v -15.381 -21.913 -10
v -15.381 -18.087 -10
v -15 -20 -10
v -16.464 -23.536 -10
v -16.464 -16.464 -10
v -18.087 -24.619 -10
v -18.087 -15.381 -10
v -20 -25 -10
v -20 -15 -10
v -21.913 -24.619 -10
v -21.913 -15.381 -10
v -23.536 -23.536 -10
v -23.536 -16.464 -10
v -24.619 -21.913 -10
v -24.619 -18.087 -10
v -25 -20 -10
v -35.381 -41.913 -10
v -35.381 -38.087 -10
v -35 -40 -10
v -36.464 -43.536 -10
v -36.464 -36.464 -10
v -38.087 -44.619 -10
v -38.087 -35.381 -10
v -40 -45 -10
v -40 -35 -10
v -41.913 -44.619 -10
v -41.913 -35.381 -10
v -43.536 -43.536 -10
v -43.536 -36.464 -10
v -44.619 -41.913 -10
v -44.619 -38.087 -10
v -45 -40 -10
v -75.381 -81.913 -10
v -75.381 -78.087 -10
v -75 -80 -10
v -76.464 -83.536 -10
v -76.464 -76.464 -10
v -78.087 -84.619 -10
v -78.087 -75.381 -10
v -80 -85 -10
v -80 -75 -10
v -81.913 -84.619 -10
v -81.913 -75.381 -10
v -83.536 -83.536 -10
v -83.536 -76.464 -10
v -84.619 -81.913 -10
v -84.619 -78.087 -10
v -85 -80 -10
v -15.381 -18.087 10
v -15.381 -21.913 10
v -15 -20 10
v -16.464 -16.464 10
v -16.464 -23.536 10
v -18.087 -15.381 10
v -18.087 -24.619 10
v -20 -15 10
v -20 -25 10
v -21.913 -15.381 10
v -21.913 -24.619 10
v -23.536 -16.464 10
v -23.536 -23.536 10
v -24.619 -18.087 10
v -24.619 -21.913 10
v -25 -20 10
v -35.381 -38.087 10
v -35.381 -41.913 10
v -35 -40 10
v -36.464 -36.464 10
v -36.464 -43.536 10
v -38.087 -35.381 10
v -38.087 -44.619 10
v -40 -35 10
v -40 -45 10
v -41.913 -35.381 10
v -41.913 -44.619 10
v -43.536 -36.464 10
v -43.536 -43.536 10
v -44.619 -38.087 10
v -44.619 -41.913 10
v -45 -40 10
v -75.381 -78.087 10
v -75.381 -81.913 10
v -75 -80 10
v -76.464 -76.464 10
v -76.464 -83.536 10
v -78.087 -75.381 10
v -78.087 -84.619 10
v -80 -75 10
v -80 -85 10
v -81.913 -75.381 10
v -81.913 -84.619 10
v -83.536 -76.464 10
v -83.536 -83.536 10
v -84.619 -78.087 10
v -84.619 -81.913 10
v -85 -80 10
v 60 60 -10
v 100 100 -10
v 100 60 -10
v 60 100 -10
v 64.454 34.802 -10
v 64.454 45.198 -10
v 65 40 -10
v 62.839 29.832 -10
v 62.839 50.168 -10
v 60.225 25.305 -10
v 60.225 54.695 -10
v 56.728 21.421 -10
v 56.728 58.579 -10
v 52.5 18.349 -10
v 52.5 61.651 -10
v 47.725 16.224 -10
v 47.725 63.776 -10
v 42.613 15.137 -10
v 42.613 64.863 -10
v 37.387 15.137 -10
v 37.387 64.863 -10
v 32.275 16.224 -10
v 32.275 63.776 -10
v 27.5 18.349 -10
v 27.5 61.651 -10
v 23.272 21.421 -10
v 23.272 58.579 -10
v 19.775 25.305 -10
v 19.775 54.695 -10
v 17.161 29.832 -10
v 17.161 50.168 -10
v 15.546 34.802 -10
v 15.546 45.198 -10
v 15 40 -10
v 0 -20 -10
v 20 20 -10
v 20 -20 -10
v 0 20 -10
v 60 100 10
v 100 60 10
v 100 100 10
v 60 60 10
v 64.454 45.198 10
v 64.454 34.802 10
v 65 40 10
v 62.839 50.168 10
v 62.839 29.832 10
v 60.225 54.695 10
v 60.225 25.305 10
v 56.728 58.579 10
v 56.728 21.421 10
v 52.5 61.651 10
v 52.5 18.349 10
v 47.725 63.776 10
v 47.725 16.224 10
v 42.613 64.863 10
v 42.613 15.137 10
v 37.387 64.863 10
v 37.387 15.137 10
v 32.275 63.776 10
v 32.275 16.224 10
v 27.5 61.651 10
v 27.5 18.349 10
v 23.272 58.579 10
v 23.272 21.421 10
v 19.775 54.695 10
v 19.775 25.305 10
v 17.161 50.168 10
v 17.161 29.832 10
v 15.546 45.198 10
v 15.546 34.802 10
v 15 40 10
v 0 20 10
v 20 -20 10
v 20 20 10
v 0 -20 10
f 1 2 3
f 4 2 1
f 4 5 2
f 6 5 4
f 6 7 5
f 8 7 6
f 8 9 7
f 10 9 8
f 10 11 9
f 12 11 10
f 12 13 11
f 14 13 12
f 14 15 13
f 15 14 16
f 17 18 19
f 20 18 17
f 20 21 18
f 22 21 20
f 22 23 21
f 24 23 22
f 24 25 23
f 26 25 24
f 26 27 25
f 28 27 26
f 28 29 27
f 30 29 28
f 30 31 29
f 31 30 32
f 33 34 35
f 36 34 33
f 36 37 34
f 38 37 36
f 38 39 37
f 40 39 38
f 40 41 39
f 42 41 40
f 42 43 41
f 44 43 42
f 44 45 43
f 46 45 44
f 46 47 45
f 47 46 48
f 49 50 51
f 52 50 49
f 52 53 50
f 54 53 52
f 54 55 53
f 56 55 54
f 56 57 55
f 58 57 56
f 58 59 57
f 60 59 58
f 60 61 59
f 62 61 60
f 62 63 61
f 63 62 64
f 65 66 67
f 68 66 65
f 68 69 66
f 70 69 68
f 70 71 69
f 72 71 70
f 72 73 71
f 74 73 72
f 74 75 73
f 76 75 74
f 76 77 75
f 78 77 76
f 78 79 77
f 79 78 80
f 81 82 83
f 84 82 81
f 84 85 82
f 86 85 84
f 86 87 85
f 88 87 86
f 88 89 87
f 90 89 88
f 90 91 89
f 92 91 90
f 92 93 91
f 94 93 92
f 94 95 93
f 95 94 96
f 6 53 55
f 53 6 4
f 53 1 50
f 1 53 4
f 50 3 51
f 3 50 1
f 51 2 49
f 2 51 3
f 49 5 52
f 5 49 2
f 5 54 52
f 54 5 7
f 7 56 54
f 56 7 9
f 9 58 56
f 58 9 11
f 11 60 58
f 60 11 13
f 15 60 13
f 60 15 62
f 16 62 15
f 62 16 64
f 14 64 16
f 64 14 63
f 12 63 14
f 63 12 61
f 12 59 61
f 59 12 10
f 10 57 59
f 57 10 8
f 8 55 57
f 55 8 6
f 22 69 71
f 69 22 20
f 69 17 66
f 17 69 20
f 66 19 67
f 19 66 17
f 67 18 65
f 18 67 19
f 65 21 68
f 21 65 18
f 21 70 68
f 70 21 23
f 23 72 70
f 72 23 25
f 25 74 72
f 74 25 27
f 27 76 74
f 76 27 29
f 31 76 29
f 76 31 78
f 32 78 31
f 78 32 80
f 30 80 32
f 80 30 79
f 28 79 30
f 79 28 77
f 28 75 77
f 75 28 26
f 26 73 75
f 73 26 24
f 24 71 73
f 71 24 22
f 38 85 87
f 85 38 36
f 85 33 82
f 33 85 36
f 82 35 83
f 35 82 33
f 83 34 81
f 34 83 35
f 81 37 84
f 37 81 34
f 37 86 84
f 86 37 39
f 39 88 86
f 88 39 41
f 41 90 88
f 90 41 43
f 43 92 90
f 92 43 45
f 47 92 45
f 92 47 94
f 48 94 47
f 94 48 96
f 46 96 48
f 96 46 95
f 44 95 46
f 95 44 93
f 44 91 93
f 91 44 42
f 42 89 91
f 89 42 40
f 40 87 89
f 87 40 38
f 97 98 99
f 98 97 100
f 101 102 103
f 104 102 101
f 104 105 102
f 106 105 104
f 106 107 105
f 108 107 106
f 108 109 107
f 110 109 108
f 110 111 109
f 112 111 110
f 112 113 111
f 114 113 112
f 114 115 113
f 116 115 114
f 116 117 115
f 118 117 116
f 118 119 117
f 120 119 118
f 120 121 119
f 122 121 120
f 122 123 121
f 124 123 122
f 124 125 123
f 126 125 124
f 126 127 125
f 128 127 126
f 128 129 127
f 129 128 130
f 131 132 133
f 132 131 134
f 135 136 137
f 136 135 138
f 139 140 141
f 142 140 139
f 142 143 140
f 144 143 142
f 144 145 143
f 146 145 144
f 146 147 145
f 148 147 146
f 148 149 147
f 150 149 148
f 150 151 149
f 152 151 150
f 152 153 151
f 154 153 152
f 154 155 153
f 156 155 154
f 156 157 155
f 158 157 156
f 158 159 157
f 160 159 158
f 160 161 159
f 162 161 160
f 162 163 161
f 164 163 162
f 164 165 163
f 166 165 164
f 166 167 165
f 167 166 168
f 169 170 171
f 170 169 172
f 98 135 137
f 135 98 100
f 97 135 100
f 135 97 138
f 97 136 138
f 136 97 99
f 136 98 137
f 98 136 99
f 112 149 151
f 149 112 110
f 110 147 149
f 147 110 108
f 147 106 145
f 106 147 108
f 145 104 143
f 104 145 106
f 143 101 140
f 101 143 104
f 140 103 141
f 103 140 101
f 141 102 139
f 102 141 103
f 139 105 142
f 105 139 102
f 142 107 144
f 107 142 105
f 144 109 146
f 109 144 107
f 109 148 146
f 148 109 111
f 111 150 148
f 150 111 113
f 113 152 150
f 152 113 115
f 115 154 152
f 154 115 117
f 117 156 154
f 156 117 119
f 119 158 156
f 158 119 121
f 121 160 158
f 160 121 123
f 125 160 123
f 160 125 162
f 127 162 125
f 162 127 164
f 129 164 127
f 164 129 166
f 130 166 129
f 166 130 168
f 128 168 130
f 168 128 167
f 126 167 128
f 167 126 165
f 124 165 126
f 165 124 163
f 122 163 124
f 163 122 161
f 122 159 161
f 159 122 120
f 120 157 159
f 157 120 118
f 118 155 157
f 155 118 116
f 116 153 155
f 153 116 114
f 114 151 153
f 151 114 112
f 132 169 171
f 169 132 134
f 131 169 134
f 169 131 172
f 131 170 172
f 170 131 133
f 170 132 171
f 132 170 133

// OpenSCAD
// LALRparser.scad which is a LALR X,Y Coordinate and Shape Specification Parser Engine Library
// Copyright (C) 2016 Bill Gertz
//
// Modified by Bill Gertz (billgertz) on 7 April 2016
// Version 0.8.0
//
// Version  Author          Change
// -------  -------------   ----------------------------------------------------------------------------
//  0.8.0   billgertz       Inital beta release
//
// Customizer View
// preview[view:south, tilt:top diagnol]
//
// License: 
//     This program is free software: you can redistribute it and/or modify it under the terms of the GNU 
//     General Public License as published by the Free Software Foundation, either version 3 of the 
//     License, or (at your option) any later version.
//
//     This program is distributed in the hope that it will be useful, but WITHOUT ANY WARRANTY; without even
//     the implied warranty of MERCHANTABILITY or FITNESS FOR A PARTICULAR PURPOSE. See the GNU General 
//     Public License for more details.
//
//     You should have received a copy of the GNU General Public License along with this program. If not, see http://www.gnu.org/licenses/.
//
// Description:
//     This implements a LALR parser that parses (x,y) coordinate list or list of 
//     shapes for use with Thingiverse's Customizer into an OpenSCAD Vector. First
//     intended to specify holes or pins for circuit board mount point, or a list of
//     shapes to cut out of a panel. This parser allows free form input rather than
//     using an ugly and clumsy exhaustive field driven interface.
//
// X,Y Coordinate Specification:
//     List of coordinates in the form:
//          (<x>, <y>) 
//     List can be specifed white space insensitive using any combination of 
//     coordinate delimiters of <none>, "," or ";"
//     For example:
//       (12.1, -13.32) ( 5, -27)(.30,-1.0)
//       (3,2),(84.3,-2 ) , ( 11 , 1. 02)
//       ( 1 4, 2 7 . 0 5);(-  28.1,4) ;(-0 ,-.1  )
// 
//     The engine tolerates wild spacing around numbers, and even odd number
//     specifications, e.g. -0.0. However malformed lists and/or coordinates
//     are discarded. e.g. "(1-1,0)" "(1.0.0,7)" "(.,.3)" "(1,2)(1" "()"
//
// Shape Specification:
//     List of shapes (circle, rectangle or square) as follows:
//          cir(<diameter>)@(<x-center>,<y-center>)
//          rec(<width>, <height>)@(<x-center>, <y-center>)
//          sqr(<side>)@(<x-center>, <y-center>)
//     As with coordinates, list can be specifed white space insensitive using
//     any combination of coordinate delimiters of <none>, "," or ";"
//     For example:
//       cir(5)@(12.1, -13.32) rec( 5, -27) @ (.30,-1.0)
//       rec (3,2) @(84.3,-2 ) , sqr( 11 ) @ ( - 2, 1. 02)
//       rec( 1 4, 2 7 . 0 5)@(-  28.1,4) ;cir(34)@(-0 ,-.1  )
// 
//     The engine tolerates wild spacing around numbers, and even odd number
//     specifications, e.g. -0.0. However malformed lists and/or shapes are 
//     discarded. e.g. "cir(1-1)@(1,1)" "sqr(1,1)*(1.0.1,6)" "rec(.,.3)@(1,1)"
//
// Notes:
//     This can be used as skeleton for different language parsers, but you
//     need to hand edit not only the token, grammar and fsa tables but embed
//     a bespoke _reduce function.
//
//     Unfortunaely the _reduce function must be declared for each LALR parser
//     The _parser could be specified as a function when OpenSCAD v2.0 is 
//     released, making this a true universal library. Until then edit the 
//     _reduce fuction for your language and release as seperate language 
//     specific library.

// constants used by LALR parser (do not edit)
_value = 0;
_name = 1;

_token = 0;
_action = 1;
_rule = 2;
_state = 2;

_accept = 0;
_goto = 1;
_reduce = 2;
_shift = 3;

_eol = "$$";
_endtoken = [undef, _eol];

_lhs = 0;
_rhs = 1;

// List Types and Marker
//   The returned coordinate or shape list and list marker
//       The returned value from a string parse is a list of 
//       coordinates or shapes (see below). These lists are
//       stuffed into a list with the first (the zero index)
//       the value as defined below, and the second (one index]
//       the list.
//       For example:
//           Blank List ""
//             [ _blank ]
//           Coordinate List "(10,10),(20,20),(30,30):
//             [ _coord, [ [10,10], [20,20], [30,30] ] ]
//           Shape List "rec(3,3)@(10,10),cir(4)@(20,20),sqr(5)@(30,30)"
//             [ _shape, [ ["rec",[3,3],[10,10] ], [ "cir",[4],[20,20] ], ["sqr",[5],[30,30] ] ] ]
_blank = 0;
_coord = 1;
_shape = 2;

// debug globals
//   $_parserStop set to step number to stop on
//       _parser returns undef if the parse fails
//       Typically this is becuase an expected symbol is encountered
//       while in a state. If _parser is dying try setting _parserStop
//       up in steps of 10 and backing off until you find the step 
//       just before it fails. Edit the FSA table to repair the fault.
$_parserStop = -1; 

// grammar 
//   Grammar of language expressed as derivative RHS symbols 
//   composed of LHS symbols (terminal tokens) or non-terminal
//   lexemes
//       List of grammar rules at a list of RHS as first element and 
//       a list of LHS composite symbols refactored to remove "or"
//       element from grammar rule. For example rule:
//           ShapeList -> ShapeList Sep Spec | Spec .
//       is expressed as two list items:
//           [ "ShapeList", [ "ShapeList", "Sep", "Spec] ],
//           [ "ShapeList", [ "Spec" ] ]
grammar = [
    [ "Start", ["ShapeList"] ],
    [ "Start", ["CoordList"] ],
    [ "Start", [] ],
    [ "ShapeList", ["ShapeList", "Sep", "Spec"] ],
    [ "ShapeList", ["Spec"] ],
    [ "CoordList", ["CoordList", "Sep", "Pair"] ],
    [ "CoordList", ["Pair"] ],
    [ "Spec", ["Shape", "@", "Pair"] ],
    [ "Shape", ["cir", "Single"] ],
    [ "Shape", ["rec", "Pair"] ],
    [ "Shape", ["sqr", "Single"] ],
    [ "Pair", ["(", "Float", ",", "Float", ")"] ],                 
    [ "Single", ["(", "Float", ")"] ],
    [ "Sep", [","] ],
    [ "Sep", [";"] ],
    [ "Sep", [] ],
    [ "Float", ["+Float"] ],
    [ "Float", ["-", "+Float"] ],
    [ "+Float", ["Integer"] ],
    [ "+Float", ["Integer", "Fraction"] ],
    [ "+Float", ["Fraction"] ],
    [ "Fraction", [".", "Digits"] ],
    [ "Integer", ["Digits"] ],
    [ "Digits", ["digit"] ],
    [ "Digits", ["Digits", "digit"] ]
] ;

// parser
//   The LALR Finite State Automata (FSA) Table
//       A list of current states the describing the next _action and
//       _rule or _state depending on the encountered symbol (token or
//       lexeme. 
parser = [
    [ [_eol, _reduce, 2], ["(", _shift, 10], ["sqr", _shift, 9], ["rec", _shift, 8], ["cir", _shift, 7], ["Start", _goto, 6], ["ShapeList", _goto, 5], ["CoordList", _goto, 4], ["Spec", _goto, 3], ["Shape", _goto, 2], ["Pair", _goto, 1] ],
    [ [_eol, _reduce, 6], [";", _reduce, 6], [",", _reduce, 6], ["(", _reduce, 6] ],
    [ ["@", _shift, 27] ],
    [ [_eol, _reduce, 4], [";", _reduce, 4], [",", _reduce, 4], ["sqr", _reduce, 4], ["rec", _reduce, 4], ["cir", _reduce, 4] ],
    [ [_eol, _reduce, 1], [";", _shift, 26], [",", _shift, 25], ["(", _reduce, 15], ["Sep", _goto, 24] ],
    [ [_eol, _reduce, 0], [";", _shift, 26], [",", _shift, 25], ["sqr", _reduce, 15], ["rec", _reduce, 15], ["cir", _reduce, 15], ["Sep", _goto, 23] ],
    [ [_eol, _accept, undef] ],
    [ ["(", _shift, 22], ["Single", _goto, 21] ],
    [ ["(", _shift, 10], ["Pair", _goto, 20] ],
    [ ["(", _shift, 22], ["Single", _goto, 19] ],
    [ ["digit", _shift, 18], [".", _shift, 17], ["-", _shift, 16], ["Float", _goto, 15], ["+Float", _goto, 14], ["Fraction", _goto, 13], ["Integer", _goto, 12], ["Digits", _goto, 11] ],
    [ ["digit", _shift, 36], [".", _reduce, 22], [",", _reduce, 22], [")", _reduce, 22] ],
    [ [".", _shift, 17], [",", _reduce, 18], [")", _reduce, 18], ["Fraction", _goto, 35] ],
    [ [",", _reduce, 20], [")", _reduce, 20] ],
    [ [",", _reduce, 16], [")", _reduce, 16] ], 
    [ [",", _shift, 34] ],
    [ ["digit", _shift, 18], [".", _shift, 17], ["+Float", _goto, 33], ["Fraction", _goto, 13], ["Integer", _goto, 12], ["Digits", _goto, 11] ],
    [ ["digit", _shift, 18], ["Digits", _goto, 32] ],
    [ ["digit", _reduce, 23], [".", _reduce, 23], [",", _reduce, 23], [")", _reduce, 23] ],
    [ ["@", _reduce, 10] ],
    [ ["@", _reduce, 9] ],
    [ ["@", _reduce, 8] ],
    [ ["digit", _shift, 18], [".", _shift, 17], ["-", _shift, 16], ["Float", _goto, 31], ["+Float", _goto, 14], ["Fraction", _goto, 13], ["Integer", _goto, 12], ["Digits", _goto, 11] ],
    [ ["sqr", _shift, 9], ["rec", _shift, 8], ["cir", _shift, 7], ["Spec", _goto, 30], ["Shape", _goto, 2] ],
    [ ["(", _shift, 10], ["Pair", _goto, 29] ],
    [ ["(", _reduce, 13], ["sqr", _reduce, 13], ["rec", _reduce, 13], ["cir", _reduce, 13] ],
    [ ["(", _reduce, 14], ["sqr", _reduce, 14], ["rec", _reduce, 14], ["cir", _reduce, 14] ],
    [ ["(", _shift, 10], ["Pair", _goto, 28] ],
    [ [_eol, _reduce, 7], [";", _reduce, 7], [",", _reduce, 7], ["sqr", _reduce, 7], ["rec", _reduce, 7], ["cir", _reduce, 7] ],
    [ [_eol, _reduce, 5], [";", _reduce, 5], [",", _reduce, 5], ["(", _reduce, 5] ],
    [ [_eol, _reduce, 3], [";", _reduce, 3], [",", _reduce, 3], ["sqr", _reduce, 3], ["rec", _reduce, 3], ["cir", _reduce, 3] ],
    [ [")", _shift, 38] ],
    [ ["digit", _shift, 36], [",", _reduce, 21], [")", _reduce, 21] ],
    [ [",", _reduce, 17], [")", _reduce, 17] ],
    [ ["digit", _shift, 18], [".", _shift, 17], ["-", _shift, 16], ["Float", _goto, 37], ["+Float", _goto, 14], ["Fraction", _goto, 13], ["Integer", _goto, 12], ["Digits", _goto, 11] ],
    [ [",", _reduce, 19], [")", _reduce, 19] ],
    [ ["digit", _reduce, 24], [".", _reduce, 24], [",", _reduce, 24], [")", _reduce, 24] ],
    [ [")", _shift, 39] ],
    [ ["@", _reduce, 12] ],
    [ [_eol, _reduce, 11], [";", _reduce, 11], [",", _reduce, 11], ["(", _reduce, 11], ["@", _reduce, 11], ["sqr", _reduce, 11], ["rec", _reduce, 11], ["cir", _reduce, 11] ]
] ;

// tokens
//    List of all valid tokens that will be encountered
//    and tokenized from the input stream as either a
//    single character or sequence of character. First
//    element is the character or sequence to match and
//    second element is the token name
tokens = [
    ["(","("],
    [")",")"],
    [",",","],
    [";",";"],
    [".","."],
    ["-","-"],
    ["@","@"],
    for(i=[0:9]) [str(i),"digit"],
    ["cir", "cir"],
    ["rec", "rec"],
    ["sqr", "sqr"]
] ;
                 
// String and string to number operators
//   substr(<string>, <pos> [, <num>])
//         returns the partial string starting at <pos> (zero index) of <string> of <num> characters
//         returns to end of <string> if no <num> given
//         returns to end of <string> if <pos> + <num> is longer than <string>
//   _int(<string>)
//         converts an unsigned <string> integer to unsigned integer
//   _frac(<string>)
//         converts decimal part of float <string> into unsigned frational floating point number
//   int(<string>)
//         converts signed integer <string> to integer
//   float(<string>)
//         converts signed float <string> to float

function substr(string, start=0, length=undef) =
    let(
        len = length == undef ? 
            len(string) - start 
        : start + length > len(string) ? 
            start + length - len(string) + 1
        : length
   ) 
    len > 0 ? 
        str(string[start], substr(string, start + 1, len - 1)) 
    : ""
;
  
function int(string) =
    let(
        sign = string[0] == "-" ? -1 : 1, 
        start = string[0] == "-" ? 1 : 0
    )
    sign * _int(substr(string,start))
;
    
function float(string) =
    let(
        sign = string[0] == "-" ? -1 : 1, 
        start = string[0] == "-" ? 1 : 0,
        radixes = search(".",string,0)
    )
    len(radixes) > 1 ?
        undef
    : sign * (_int(substr(string, start, radixes[0][0]-start)) + _frac(substr(string, radixes[0][0]+1)))
;
   
function _int(string, i=0, carry=0) =
    let(
        digit = search(string[i], "0123456789")[0]
    )
    i == len(string) ? 
		carry
    : digit == undef ? undef : carry + _int(string, i+1, digit * pow(10,len(string)-i-1))
;                  

function _frac(string, i=0, carry=0) =
    let(
        digit = search(string[i], "0123456789")[0]
    )
	i == len(string) ? 
		carry
    : digit == undef ? undef : carry + _frac(string, i+1, digit * pow(10,-i-1))
;        

// Stack operators
//
//   push, unshift(<item>, <stack>)
//       push returns stack with <item> added to head of <stack>
//       unshit returns stack with <item> added to tail of <stack>
                 
function push(item, stack=undef) = stack == undef ? [item] : concat([item], stack);      
function unshift(item, stack=undef) = stack == undef ? [item] : concat(stack, [item]); 
                 
// pop, shift(<stack> [, <num>]) 
//      return stack after removing <num> items from <stack>
//      return undef on attempt to remove more than <num> items on <stack>
//      return empty stack when removing all items off stack (<num> = stack length)
              
function pop(stack, num=1) = 
    let(
        length = len(stack)
     ) 
     num > length ? 
         undef
     : num == length ?
         [] 
     : [ for(i=[num:length-1]) stack[i] ]
;
        
function shift(stack, num=1) = 
    let(
        length = len(stack)
    ) 
    num > length ? 
        undef 
    : num == length ? 
        [] 
    : [ for(i=[0:length-num-1]) stack[i] ]
;
    
// head, tail(<stack> [, <num>])
//       return null list if asked for zero items
//       return <num> of items from <stack>
//       return all items as list of stack if <num> more than length of stack
//       return single item from <stack> (not embeded in list) if no number passed
  
function head(stack, num=undef) = 
    let(
        run = min(len(stack), num)
    ) 
    num == undef ?
        stack[0] 
    : num == 0 ? 
        [] 
    : [ for(i=[0:run-1]) stack[i] ]
;
    
function tail(stack, num=undef) = 
    let(
        run = min(len(stack), num),
        length = len(stack)
    ) 
    num == undef ? 
        stack[length-1] 
    : num == 0 ? 
        [] 
    : [ for(i=[run:-1:1]) stack[length-i] ]
;

// _nextVector(<fsa>, <state>, <token>)
//   fetch triple of lookup token, _action and _state or _rule
//       Simply searches for the passed <token> in row <state>
//       from the LALR parser <fsa> table

function _nextVector(fsa, state, token) = fsa[state][search([ token[_name] ],fsa[state],1)[0]];

// _tokenize(<string>, <tokens>)
//   return input <string> as a stack of <tokens>
//       Creates a stack by looking up each character or matching
//       unbroken sequence of characters against <tokens> list.
//       Whitespace characters (" ", tab, newline, return) are
//       not tokenized but will stop character sequence token
//       recognition ("ci r " will not be recoginzed as shape
//       token "cir")
    
function _tokenize(string, tokens, pstring="", ostack=undef, i=0) = 
    let(
        token = tokens[search([string[i]],tokens)[0]],
        ptoken = tokens[search([pstring],tokens)[0]]
    )
    i < len(string) ? // keep tokeninzing until end of string
        ptoken[_name] == undef ?  // if the accumulated string doesn't match any sequence tokens
            search(string[i]," \t\n\r")[0] == undef ? // if the character isn't a whitespace
                token[_name] == undef ? // if the character doesn't match nat tokens add it to the accumulated string and continue
                    _tokenize(string, tokens, str(pstring, string[i]), ostack, i+1) 
                :
                    _tokenize(string, tokens, "", push(token, ostack), i+1) // if found in tokens then add token to stack and continue
            :
                _tokenize(string, tokens, "", ostack, i+1) // if a whitespace then clear the accumulated token and continue
        :
             _tokenize(string, tokens, "", push(ptoken, ostack), i) // if found a token from the accumulated string then add token and continue
    : len(pstring) == 0 ? // if at end of string add the end of input token and finish
        push(_endtoken, ostack)
    : undef // if somehow past end of string then return error (undef)
 ;

// _reduce(<rule>, <grammar>, <output stack>)
//   reduces <ostack> by <rule> number defined in <grammar>
//       Builds desired output lists by using elements from
//       output stack as defined in LHS of gramar rule. The
//       _reduce function depends on the desired output from
//       the parse. In this case it builds one of three lists
//       as outined in List Types and Markers discussed above.
//       The fuction works much like a case statement where
//       each case defines the reduction to build the output
//       based on each grammar rule.

function _reduce(rule, grammar, ostack) =
    let(
        lexeme = grammar[rule][_lhs],
        count = len(grammar[rule][_rhs]),
        tokens = tail(ostack, count),
        wstack = shift(ostack, count)
    )
    // case rule of
    rule == undef ?
        undef
    : rule == 0 ? // mark that a shape list is returned by element zero eq to _shape
        [_shape, tail(ostack)[_value]]
    : rule == 1 ? // coordinate list is returned by element zero eq to _coord
        [_coord, tail(ostack)[_value]]
    : rule == 2 ? // blank list (null list) is returned by element zero eq to _blank
        [_blank]
    : rule == 3 ? // add the Shape to the SpecList
        unshift([ unshift(tokens[2][_value], tokens[0][_value]), lexeme ], wstack)
    : rule == 4 ? // embed Shape in SpecList 
        unshift([ [tokens[0][_value]], lexeme ], wstack)
    : rule == 5 ? // add the Pair to the CoordList
        unshift([ unshift(tokens[2][_value], tokens[0][_value]), lexeme ], wstack)
    : rule == 6 ? // embed Pair in CoordList 
        unshift([ [tokens[0][_value]], lexeme ], wstack)
    : rule == 7 ? // turn into Spec (shape and location vector)
        unshift([ [ for(i=[0:len(tokens)-2])tokens[0][_value][i], tokens[2][_value] ], lexeme ], wstack)
    : rule == 8 || rule == 9 || rule == 10 ? // turn into Shape (name and parameters vector)
        unshift([ [tokens[0][_name], tokens[1][_value]], lexeme ], wstack)
    : rule == 11 ?  // turn parenthetical comma seperated x,y into vector Pair
        unshift([ [tokens[1][_value], tokens[3][_value]], lexeme ], wstack)
    : rule == 12 ?  // turn parenthetical value into vector Single
        unshift([ [tokens[1][_value]], lexeme ], wstack)
    : rule == 17 ?  // negate the +Float to make Float
        unshift([ -tokens[1][_value], lexeme ], wstack)
    : rule == 19 ?  // add the fractional to the integer to make +Float
        unshift([ tokens[0][_value] + tokens[1][_value], lexeme ], wstack)
    : rule == 21 ?  // convert numeric string behind decimal point into Fraction
        unshift([ _frac(tokens[1][_value]), lexeme ], wstack)
    : rule == 22 ?  // convert numeric string into Integer
        unshift([ _int(tokens[0][_value]), lexeme ], wstack)
    : rule == 24 ?  // concatenate digit to make Digits 
        unshift([ str(tokens[0][_value], tokens[1][_value]), lexeme ], wstack)
    // else just update the lexeme but leave the value unchanged
    : unshift([ tokens[0][_value], lexeme ], wstack)
;

// _parse(<token stack>, <grammar>, <fsa>)
//   reurn list output parsed according to the LALR parser <fsa>
//   table from the <token stack> using the defined <grammar>
function _parse(tstack, grammar, fsa, sstack=[0], ostack=undef, step=0) =
    let(
         token = tail(tstack),
         state = head(sstack),
         nextVector = _nextVector(fsa, state, token),
         action = nextVector[_action],
         rule = nextVector[_rule]
    )
    step == $_parserStop ? // shortcut for setting up debugging - set global $_parserStop to problem parse step to debug parsing
        str("===> DEBUG: Parser stopped at ", step, ": token: ", token, ", state: ", state, ", nextVector: ", nextVector, ", sStack: ", sstack, ", tStack: ", tstack, ", oStack: ", ostack)
    : len(tstack) == 0 ?  // if we've exhausted the token stack something has gone horribly wrong
        undef
    : action == _accept ? // _accept action simply outputs the output stack
        ostack
    : action == _goto ?   // _goto action shifts the token stack and pushes the next state on the state stack
        _parse(shift(tstack), grammar, fsa, push(nextVector[_state], sstack), ostack, step+1)
    : action == _shift ?  // _shift action shifts token stack, pushes the next state on the state stack, moves the token to the operation stack
        _parse(shift(tstack), grammar, fsa, push(nextVector[_state], sstack), unshift(token, ostack), step+1)
    : action == _reduce ? // _reduce action pops the state stack the number of tokens from the grammar rule RHS, shifts the LHS token into the token stack and reduces the operations stack
        _parse(unshift([undef, grammar[rule][_lhs]], tstack), grammar, fsa, pop(sstack,len(grammar[rule][_rhs])), _reduce(rule, grammar, ostack), step+1)
    : undef // otherwise the action is undefined or FSA table is mangled
 ;   

// parse(<string>, <token>, <grammar>, <fsa>)
//   combine _toeknize and _parse into a single step by
//   parsing the given <string> using <token> and defined
//   <grammar> with LALR parser <fsa> table.
//
//   defaults to given tokens, grammar and paser tables in this
//   module
//       Verifies that all input elements are at least defined
//       before attempting to run.

function parse(string, tokens=tokens, grammar=grammar, fsa=parser) = 
    fsa == undef || grammar == undef || tokens == undef ?
        undef
    : _parse(_tokenize(string, tokens), grammar, fsa)
;

// Test Cases
coordString = "(11,- 2.15);(- 3 1 . 7 5, 12.222)(-1,11),(-0,-.04)";
echo(str("Parse of \"", coordString, "\" is ", parse(coordString)));
shapeString = "rec(5,4)@(11,- 2.15) cir(10)@(4.0,8.0) ;  sqr(30)@(40.0,-18.808)";
echo(str("Parse of \"", shapeString, "\" is ", parse(shapeString)));
blankString = "";
echo(str("Parse of \"", blankString, "\" is ", parse(blankString)));
badString = "rec(5,4)@(11,- 2.1 cir(10)@(4.0,8.0)";
echo(str("Parse of \"", badString, "\" is ", parse(badString)));
longString = "abcdefg1234567";
echo(str("Substring of \"", longString, "\" from 7 to end is ", substr(longString,7)));
echo(str("Substring of \"", longString, "\" from 5 for 4 is ", substr(longString,5,4)));
intString = "-12";
echo(str("Integer of \"", intString, "\" is ", int(intString)));
floatString = "-12.1";
echo(str("Float of \"", floatString, "\" is ", float(floatString)));

// Usage Examples
// constants to name returned List elements
type = 0;
list = 1;

name = 0;
param = 1;
coord = 2;

//parse the sample coord list string
coordList = parse("(-20,-20) (-40,-40) (-80,-80)");

// show example as linear extrude
if (coordList[type] == _coord) linear_extrude(height=20, center=true) {
    for(i=[ 0:len(coordList[list])-1 ]) {
        coord = coordList[list][i];
        
        echo(str("Drawing circle with radius 5 at ", coord));    
        translate (coord) circle(r=5);
    } 
}

//parse the sample shape list string
shapeList = parse("rec(20,40)@(10,0) cir(50)@(40,40) sqr(40)@(80,80)");

// show example as linear extrude
if (shapeList[type] == _shape) linear_extrude(height=20, center=true) {
    for(i=[ 0:len(shapeList[list])-1 ]) {
        shape = shapeList[list][i][name];
        parameter = shapeList[list][i][param];
        coord = shapeList[list][i][coord];
        
        echo(str("Drawing ", shape, " with parameter ", parameter, " at ", coord));
        
        if (shape == "cir") translate (coord) circle(d=parameter[0]);
        else if (shape == "sqr") translate (coord) square(size=parameter[0], center=true);
        else if (shape == "rec") translate (coord) square(size=parameter, center=true);
    } 
}
